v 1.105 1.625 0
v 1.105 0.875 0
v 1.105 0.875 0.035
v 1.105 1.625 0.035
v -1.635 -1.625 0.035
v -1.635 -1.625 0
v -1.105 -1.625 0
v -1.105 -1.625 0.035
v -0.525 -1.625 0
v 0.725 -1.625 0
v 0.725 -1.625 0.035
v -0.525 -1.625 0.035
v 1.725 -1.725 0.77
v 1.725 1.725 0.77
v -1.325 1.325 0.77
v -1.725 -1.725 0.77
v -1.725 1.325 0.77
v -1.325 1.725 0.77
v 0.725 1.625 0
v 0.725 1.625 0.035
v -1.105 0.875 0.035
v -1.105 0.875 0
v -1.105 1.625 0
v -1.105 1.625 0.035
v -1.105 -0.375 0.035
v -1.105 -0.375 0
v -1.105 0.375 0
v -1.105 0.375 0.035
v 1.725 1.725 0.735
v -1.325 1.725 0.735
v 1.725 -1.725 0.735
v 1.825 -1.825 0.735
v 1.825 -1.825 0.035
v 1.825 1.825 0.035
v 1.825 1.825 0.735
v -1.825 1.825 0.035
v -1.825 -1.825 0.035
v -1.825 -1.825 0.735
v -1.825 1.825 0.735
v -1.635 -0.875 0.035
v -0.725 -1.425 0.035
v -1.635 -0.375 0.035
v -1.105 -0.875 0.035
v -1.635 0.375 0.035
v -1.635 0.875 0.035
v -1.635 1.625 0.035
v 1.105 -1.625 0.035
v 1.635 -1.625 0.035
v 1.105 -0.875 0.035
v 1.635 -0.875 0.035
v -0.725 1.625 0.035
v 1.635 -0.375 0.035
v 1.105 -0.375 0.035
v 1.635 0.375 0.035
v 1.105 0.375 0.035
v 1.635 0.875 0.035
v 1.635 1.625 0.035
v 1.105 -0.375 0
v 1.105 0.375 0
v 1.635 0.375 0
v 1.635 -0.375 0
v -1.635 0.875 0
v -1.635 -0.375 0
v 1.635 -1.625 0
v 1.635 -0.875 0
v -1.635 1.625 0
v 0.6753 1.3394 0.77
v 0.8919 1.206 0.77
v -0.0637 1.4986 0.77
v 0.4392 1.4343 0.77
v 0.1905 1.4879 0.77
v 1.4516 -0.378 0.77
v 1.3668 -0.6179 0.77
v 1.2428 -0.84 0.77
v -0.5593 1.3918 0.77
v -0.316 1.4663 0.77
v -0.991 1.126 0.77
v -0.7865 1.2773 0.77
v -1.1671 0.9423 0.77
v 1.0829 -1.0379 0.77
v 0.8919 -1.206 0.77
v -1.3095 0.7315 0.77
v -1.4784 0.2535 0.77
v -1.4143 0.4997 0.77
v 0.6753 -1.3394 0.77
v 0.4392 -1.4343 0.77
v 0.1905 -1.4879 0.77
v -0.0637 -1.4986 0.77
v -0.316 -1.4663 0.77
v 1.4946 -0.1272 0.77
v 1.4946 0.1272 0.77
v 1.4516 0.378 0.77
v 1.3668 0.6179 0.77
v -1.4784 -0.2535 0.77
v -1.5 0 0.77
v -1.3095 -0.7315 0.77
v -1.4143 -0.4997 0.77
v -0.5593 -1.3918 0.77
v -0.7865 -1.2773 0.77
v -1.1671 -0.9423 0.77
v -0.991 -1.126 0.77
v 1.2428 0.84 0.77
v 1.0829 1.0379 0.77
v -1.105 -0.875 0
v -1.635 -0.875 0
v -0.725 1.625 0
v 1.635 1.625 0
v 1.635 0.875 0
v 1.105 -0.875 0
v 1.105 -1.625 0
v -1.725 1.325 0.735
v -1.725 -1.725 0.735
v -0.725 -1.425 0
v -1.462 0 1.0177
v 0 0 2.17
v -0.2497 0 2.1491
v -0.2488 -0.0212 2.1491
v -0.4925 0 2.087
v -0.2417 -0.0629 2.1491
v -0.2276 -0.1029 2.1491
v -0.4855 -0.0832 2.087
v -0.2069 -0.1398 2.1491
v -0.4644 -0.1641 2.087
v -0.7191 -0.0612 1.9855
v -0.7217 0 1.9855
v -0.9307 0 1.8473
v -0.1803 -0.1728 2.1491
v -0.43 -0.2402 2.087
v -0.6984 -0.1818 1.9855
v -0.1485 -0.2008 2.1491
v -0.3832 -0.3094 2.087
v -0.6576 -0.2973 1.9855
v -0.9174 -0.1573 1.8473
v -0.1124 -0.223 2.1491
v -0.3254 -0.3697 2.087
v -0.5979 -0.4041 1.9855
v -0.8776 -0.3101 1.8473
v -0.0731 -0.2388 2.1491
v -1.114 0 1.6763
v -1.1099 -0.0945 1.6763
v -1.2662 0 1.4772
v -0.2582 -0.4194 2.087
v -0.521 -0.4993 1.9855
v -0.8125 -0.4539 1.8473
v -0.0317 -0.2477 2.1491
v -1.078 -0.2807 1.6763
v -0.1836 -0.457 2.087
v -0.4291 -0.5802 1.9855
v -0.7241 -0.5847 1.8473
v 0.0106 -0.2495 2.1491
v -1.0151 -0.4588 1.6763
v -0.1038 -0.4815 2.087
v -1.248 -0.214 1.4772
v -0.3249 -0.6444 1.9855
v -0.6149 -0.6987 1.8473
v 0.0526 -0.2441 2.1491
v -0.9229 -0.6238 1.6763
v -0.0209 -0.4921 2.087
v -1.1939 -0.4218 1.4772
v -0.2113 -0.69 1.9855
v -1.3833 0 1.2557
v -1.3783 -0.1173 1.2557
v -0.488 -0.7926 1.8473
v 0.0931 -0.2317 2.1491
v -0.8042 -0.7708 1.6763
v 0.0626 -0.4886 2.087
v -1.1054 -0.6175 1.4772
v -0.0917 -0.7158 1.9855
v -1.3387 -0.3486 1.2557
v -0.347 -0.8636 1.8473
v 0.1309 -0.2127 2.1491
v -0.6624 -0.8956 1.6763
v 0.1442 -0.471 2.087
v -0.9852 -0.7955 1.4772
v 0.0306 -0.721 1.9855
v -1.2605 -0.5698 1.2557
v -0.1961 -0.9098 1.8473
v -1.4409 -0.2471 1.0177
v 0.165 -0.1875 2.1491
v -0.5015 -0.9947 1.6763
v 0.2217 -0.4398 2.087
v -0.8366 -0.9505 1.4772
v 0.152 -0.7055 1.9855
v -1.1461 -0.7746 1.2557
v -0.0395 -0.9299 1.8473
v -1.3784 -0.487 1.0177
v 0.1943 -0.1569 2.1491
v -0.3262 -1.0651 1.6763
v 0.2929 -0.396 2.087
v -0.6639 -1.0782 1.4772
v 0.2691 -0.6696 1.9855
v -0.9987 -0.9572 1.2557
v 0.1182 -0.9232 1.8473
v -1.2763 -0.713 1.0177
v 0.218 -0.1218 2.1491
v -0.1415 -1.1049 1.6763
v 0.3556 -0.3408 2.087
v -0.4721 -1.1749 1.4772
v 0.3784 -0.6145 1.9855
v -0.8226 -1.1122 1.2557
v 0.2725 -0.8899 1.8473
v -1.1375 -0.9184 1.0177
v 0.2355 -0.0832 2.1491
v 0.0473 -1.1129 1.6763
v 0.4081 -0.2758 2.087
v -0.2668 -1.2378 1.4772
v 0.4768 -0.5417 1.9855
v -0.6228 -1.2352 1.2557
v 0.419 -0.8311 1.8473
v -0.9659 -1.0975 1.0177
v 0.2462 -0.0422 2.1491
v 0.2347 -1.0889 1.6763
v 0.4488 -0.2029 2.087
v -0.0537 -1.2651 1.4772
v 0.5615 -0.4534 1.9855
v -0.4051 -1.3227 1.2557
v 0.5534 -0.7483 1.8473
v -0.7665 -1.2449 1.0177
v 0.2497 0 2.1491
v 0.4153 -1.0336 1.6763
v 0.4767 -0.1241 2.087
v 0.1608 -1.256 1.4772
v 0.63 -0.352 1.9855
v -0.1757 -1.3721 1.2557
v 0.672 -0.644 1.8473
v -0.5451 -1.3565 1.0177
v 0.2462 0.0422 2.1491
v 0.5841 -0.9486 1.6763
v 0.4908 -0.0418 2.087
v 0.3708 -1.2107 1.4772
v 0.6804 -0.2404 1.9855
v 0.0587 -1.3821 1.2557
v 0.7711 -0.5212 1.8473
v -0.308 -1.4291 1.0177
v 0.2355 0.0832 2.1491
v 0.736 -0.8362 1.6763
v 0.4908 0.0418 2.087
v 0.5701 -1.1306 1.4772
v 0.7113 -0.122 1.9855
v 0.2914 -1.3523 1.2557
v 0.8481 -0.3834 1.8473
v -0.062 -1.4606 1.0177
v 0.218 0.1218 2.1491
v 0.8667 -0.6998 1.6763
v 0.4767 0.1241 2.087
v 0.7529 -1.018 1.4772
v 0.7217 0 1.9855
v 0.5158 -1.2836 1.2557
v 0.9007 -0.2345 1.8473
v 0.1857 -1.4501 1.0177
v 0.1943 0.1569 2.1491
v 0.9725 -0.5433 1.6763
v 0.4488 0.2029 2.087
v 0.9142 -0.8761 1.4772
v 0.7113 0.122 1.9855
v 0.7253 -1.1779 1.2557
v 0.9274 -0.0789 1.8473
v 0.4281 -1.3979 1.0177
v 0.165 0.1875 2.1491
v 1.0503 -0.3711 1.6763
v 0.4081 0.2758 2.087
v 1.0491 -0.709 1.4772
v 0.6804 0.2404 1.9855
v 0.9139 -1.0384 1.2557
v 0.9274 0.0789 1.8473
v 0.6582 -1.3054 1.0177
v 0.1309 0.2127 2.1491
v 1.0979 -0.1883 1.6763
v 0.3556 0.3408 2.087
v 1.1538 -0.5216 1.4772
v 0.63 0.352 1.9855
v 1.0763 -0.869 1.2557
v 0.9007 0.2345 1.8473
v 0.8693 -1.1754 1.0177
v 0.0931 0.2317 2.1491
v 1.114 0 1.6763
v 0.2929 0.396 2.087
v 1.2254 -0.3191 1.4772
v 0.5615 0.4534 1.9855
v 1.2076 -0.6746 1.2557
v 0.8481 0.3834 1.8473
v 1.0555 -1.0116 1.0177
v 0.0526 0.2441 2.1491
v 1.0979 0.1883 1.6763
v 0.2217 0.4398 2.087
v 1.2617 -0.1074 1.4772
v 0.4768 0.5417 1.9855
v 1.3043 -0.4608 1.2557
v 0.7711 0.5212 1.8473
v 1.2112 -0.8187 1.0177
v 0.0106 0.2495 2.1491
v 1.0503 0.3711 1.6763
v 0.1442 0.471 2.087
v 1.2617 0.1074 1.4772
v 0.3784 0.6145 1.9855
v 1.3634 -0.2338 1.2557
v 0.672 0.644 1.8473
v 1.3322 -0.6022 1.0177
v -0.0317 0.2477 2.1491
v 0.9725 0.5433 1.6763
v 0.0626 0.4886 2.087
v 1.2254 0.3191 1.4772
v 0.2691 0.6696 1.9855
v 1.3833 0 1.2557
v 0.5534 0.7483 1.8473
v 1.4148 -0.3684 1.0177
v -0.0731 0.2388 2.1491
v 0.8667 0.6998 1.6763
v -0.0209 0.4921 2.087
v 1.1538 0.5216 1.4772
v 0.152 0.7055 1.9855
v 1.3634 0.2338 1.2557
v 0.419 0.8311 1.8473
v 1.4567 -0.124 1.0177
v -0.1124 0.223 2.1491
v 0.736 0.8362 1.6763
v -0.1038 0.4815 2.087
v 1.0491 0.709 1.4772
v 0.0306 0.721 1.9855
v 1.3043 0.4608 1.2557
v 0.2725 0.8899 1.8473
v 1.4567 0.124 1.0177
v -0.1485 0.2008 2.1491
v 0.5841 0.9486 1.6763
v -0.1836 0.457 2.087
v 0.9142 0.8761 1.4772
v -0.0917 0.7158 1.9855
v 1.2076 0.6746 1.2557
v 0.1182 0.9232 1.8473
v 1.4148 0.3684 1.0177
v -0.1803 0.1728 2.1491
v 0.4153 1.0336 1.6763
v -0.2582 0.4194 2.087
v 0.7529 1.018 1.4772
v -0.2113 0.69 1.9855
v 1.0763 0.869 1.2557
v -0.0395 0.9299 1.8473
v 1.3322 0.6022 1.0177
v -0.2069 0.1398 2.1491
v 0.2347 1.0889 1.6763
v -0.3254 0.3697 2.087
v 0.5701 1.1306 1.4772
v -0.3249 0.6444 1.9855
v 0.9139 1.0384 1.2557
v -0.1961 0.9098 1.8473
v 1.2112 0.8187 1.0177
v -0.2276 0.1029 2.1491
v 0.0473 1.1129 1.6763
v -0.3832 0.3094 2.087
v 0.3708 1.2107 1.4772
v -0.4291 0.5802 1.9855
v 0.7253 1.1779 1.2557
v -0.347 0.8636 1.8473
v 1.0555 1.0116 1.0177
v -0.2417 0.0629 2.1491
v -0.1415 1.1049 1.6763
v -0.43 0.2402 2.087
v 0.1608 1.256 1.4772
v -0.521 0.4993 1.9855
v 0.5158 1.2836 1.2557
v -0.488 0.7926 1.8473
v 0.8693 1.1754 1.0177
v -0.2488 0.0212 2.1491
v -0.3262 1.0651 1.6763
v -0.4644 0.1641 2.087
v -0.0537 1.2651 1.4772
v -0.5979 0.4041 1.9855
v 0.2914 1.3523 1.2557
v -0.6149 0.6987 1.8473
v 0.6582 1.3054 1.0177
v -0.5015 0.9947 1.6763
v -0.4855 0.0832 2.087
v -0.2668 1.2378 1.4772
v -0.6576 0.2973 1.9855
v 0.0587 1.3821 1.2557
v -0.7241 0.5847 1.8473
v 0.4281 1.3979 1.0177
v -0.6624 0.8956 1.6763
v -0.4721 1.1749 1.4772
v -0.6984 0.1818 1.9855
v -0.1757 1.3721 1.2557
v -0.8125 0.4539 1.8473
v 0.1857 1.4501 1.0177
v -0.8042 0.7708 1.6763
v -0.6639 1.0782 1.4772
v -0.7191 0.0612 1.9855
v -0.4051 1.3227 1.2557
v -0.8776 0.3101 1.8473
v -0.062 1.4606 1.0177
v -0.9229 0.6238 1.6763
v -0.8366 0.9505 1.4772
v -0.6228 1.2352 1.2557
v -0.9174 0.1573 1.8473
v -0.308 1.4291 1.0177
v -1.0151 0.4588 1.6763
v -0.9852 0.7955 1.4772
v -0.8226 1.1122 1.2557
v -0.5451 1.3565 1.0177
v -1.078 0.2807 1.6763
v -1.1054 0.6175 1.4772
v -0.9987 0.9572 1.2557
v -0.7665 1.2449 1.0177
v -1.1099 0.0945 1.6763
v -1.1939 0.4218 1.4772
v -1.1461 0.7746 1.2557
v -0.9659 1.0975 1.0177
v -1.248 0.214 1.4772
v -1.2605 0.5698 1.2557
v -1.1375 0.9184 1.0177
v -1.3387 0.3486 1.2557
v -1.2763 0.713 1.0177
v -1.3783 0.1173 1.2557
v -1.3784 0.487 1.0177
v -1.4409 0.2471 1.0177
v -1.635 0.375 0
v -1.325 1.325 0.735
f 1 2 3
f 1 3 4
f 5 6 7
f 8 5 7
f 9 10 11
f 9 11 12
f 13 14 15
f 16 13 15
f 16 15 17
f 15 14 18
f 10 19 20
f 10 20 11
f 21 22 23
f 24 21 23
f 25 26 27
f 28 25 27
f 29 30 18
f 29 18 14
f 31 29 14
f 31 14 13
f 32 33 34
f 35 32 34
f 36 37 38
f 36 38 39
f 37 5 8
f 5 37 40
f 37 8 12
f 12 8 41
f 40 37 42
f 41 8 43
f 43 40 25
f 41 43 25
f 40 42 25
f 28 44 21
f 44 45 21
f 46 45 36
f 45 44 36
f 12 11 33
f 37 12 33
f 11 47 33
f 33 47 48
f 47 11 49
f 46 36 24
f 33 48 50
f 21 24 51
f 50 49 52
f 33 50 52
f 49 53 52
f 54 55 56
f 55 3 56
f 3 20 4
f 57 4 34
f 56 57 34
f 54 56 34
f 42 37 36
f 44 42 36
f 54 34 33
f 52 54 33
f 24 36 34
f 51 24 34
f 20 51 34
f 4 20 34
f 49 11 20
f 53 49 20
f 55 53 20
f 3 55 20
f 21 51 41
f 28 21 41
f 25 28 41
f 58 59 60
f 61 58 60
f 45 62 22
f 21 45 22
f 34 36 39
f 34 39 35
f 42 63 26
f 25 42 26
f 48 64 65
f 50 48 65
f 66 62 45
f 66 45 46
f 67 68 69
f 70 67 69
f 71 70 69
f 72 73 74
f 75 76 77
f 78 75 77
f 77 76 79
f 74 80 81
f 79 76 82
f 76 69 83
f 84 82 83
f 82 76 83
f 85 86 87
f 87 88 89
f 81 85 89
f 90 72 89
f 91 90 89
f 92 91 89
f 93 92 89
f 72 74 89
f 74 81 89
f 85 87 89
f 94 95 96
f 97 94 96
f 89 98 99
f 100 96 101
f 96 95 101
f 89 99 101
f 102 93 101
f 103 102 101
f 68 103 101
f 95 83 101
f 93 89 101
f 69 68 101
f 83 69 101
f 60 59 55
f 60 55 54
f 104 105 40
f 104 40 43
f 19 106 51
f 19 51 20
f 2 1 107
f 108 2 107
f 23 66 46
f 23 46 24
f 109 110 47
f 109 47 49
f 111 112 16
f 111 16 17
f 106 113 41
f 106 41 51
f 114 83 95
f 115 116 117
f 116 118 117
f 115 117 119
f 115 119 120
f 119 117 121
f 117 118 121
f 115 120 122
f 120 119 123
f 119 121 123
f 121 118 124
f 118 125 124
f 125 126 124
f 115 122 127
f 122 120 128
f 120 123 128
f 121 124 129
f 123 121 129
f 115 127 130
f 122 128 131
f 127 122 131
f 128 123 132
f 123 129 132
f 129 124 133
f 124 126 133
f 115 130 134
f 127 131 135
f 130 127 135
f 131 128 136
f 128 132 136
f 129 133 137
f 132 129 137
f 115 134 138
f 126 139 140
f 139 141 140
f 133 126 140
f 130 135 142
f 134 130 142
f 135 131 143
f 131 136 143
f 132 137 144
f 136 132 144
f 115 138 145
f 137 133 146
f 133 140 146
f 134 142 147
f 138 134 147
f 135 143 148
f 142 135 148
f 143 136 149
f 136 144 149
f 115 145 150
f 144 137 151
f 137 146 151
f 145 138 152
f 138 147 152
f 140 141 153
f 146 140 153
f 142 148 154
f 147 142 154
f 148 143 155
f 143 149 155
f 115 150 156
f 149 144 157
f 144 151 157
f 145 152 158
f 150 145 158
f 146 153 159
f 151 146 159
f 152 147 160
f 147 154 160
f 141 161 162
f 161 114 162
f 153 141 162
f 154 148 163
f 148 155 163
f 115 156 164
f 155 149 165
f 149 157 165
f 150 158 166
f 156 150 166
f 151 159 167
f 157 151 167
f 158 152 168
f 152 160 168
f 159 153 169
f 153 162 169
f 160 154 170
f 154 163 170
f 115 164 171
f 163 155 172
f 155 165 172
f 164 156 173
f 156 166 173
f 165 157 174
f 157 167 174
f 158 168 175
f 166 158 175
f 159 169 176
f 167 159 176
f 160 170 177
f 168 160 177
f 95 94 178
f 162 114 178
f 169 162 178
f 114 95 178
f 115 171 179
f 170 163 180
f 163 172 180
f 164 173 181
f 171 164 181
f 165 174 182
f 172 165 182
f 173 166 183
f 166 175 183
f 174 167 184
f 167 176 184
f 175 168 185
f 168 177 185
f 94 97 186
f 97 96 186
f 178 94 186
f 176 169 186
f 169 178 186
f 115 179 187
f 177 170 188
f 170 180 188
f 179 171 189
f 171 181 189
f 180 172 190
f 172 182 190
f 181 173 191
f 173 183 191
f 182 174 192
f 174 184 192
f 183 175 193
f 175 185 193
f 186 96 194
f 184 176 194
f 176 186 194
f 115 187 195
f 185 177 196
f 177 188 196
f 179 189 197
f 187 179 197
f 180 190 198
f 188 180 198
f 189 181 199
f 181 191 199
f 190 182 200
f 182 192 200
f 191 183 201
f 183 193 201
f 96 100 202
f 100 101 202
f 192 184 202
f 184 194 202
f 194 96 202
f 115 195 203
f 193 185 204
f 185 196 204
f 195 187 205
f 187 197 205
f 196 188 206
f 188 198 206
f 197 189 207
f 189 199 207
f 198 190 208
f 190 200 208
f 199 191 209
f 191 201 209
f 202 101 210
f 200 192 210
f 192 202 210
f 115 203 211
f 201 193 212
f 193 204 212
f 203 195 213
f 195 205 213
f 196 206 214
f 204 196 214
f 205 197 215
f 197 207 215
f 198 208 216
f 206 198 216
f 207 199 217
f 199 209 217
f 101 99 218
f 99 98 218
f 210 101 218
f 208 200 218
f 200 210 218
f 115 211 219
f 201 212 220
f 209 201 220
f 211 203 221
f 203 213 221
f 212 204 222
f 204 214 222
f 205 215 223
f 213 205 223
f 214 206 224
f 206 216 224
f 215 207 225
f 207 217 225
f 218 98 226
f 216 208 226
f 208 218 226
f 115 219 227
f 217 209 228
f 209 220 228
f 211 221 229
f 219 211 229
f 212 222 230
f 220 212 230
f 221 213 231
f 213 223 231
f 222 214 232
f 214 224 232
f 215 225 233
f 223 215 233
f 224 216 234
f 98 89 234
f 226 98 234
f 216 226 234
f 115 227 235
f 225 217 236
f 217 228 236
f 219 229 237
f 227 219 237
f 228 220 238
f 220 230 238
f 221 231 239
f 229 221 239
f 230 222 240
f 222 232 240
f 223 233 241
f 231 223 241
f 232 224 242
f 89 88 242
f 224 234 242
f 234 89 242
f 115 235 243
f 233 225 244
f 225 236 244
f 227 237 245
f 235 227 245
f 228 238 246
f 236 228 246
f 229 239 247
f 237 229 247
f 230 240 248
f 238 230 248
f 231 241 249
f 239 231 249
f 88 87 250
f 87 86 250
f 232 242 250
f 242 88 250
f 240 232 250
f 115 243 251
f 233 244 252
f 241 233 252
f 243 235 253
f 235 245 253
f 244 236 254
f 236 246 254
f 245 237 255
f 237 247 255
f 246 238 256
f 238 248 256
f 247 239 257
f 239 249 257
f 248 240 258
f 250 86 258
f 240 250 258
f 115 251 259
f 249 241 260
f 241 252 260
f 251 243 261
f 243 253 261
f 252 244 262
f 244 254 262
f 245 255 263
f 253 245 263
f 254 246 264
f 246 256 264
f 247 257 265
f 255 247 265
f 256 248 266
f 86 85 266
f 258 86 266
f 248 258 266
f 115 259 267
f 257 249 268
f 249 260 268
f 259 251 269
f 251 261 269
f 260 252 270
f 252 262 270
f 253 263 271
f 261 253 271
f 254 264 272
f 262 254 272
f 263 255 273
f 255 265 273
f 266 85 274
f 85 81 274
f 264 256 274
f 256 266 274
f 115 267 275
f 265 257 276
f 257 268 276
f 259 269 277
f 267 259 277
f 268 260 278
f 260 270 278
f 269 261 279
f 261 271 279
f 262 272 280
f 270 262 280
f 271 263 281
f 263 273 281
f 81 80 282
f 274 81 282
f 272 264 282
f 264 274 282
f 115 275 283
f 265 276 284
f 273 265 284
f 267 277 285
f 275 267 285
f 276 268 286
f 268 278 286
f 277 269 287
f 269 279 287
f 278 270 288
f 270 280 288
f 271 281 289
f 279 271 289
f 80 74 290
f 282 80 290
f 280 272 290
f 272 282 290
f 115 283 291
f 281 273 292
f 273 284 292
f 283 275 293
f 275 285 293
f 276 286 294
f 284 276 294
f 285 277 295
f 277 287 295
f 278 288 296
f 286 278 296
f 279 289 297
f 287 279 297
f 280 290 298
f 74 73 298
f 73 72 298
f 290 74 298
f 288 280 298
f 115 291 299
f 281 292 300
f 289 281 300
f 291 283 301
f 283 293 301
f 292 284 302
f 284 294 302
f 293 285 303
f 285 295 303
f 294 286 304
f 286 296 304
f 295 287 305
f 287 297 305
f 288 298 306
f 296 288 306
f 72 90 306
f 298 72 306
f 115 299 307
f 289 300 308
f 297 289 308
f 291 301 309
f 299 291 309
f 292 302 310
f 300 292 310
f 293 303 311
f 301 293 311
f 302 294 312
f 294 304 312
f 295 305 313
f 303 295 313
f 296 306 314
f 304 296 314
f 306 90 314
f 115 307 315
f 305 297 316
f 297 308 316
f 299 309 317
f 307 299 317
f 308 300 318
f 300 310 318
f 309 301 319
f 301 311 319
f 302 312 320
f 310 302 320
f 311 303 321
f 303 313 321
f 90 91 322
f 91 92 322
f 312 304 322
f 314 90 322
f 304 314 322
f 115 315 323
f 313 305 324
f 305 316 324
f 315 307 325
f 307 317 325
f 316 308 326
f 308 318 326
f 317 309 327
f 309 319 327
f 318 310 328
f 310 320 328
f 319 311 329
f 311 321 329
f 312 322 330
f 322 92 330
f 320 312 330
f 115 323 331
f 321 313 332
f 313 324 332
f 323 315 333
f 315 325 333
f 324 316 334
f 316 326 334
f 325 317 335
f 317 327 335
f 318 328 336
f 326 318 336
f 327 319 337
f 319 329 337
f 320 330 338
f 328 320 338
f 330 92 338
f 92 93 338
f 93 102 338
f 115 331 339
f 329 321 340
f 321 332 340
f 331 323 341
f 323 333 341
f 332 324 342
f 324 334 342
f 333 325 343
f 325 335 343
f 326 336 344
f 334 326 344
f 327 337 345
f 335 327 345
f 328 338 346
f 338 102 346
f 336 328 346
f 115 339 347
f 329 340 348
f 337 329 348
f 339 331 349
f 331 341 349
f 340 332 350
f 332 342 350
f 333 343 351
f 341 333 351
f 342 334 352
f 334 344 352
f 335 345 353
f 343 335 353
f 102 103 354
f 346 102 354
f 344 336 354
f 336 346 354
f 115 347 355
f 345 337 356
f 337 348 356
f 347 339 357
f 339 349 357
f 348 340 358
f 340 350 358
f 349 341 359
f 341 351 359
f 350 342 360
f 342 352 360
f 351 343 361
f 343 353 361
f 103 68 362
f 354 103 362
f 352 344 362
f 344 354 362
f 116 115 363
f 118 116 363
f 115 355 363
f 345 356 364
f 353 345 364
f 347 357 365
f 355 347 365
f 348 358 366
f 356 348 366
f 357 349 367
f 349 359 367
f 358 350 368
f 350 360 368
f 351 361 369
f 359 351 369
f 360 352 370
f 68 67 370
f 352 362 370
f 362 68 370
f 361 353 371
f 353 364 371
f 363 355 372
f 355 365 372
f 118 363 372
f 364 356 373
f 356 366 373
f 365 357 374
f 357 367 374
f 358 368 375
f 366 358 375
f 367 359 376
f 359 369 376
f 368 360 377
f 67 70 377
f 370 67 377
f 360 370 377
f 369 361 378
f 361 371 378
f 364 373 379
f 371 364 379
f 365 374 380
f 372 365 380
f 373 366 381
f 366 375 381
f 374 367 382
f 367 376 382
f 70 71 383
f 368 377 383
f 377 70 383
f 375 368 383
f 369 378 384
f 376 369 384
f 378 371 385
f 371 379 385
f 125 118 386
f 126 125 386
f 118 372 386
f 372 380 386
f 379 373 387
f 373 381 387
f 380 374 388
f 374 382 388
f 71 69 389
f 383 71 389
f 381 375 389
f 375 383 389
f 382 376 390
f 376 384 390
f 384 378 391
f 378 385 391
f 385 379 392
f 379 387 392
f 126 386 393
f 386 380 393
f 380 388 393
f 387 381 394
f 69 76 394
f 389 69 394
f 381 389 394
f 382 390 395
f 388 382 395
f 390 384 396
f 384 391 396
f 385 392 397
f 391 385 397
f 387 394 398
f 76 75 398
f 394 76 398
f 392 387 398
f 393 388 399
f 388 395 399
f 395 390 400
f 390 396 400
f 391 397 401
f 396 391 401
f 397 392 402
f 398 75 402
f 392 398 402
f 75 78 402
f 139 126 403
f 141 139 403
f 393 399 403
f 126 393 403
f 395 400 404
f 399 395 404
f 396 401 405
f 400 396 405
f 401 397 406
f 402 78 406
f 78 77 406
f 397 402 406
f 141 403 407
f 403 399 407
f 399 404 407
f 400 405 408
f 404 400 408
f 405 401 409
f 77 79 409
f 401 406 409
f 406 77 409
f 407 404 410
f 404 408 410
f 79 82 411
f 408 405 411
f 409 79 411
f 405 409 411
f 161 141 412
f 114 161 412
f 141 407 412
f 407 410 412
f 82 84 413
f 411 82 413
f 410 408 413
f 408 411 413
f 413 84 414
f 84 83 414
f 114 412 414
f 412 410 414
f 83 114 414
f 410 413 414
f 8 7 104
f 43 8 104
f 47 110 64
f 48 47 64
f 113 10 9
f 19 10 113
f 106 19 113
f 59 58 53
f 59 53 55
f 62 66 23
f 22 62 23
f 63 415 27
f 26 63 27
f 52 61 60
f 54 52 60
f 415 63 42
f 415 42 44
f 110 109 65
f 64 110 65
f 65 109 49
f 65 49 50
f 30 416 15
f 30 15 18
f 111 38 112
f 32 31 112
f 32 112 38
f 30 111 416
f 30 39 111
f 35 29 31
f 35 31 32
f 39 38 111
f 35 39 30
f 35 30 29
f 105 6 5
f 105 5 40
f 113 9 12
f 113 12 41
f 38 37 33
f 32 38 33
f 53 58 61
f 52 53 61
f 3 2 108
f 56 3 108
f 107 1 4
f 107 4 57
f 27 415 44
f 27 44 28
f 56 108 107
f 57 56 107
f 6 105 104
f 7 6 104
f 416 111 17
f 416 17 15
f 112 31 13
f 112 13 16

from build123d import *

# Parameters (mm, degrees)
EXTRUDE_1_DEPTH   = 0.035
SKETCH_1_W        = 0.53
SKETCH_1_H        = 0.75
EXTRUDE_1_2_DEPTH = 0.035
EXTRUDE_1_3_DEPTH = 0.035
EXTRUDE_1_4_DEPTH = 0.035
EXTRUDE_1_5_DEPTH = 0.035
EXTRUDE_1_6_DEPTH = 0.035
EXTRUDE_1_7_DEPTH = 0.035
SKETCH_2_W        = 3.65
SKETCH_2_H        = 3.65
EXTRUDE_2_DEPTH   = 0.7
EXTRUDE_3_DEPTH   = 0.035


with BuildPart() as part:
    # Эскиз1 → Бобышка-Вытянуть1 (new body)
    with BuildSketch(Plane.XY):
        Polygon((0.725, -1.625), (-0.525, -1.625), (-0.725, -1.425), (-0.725, 1.625), (0.725, 1.625), align=None)
    extrude(amount=EXTRUDE_1_DEPTH)



with BuildPart() as body_2:
    # Эскиз1 → Extrude 1 2 (new body)
    with BuildSketch(Plane.XY):
        with Locations((1.37, -1.25)):
            Rectangle(SKETCH_1_W, SKETCH_1_H)
    extrude(amount=EXTRUDE_1_2_DEPTH)


with BuildPart() as body_3:
    # Эскиз1 → Extrude 1 3 (new body)
    with BuildSketch(Plane.XY):
        with Locations((-1.37, -1.25)):
            Rectangle(SKETCH_1_W, SKETCH_1_H)
    extrude(amount=EXTRUDE_1_3_DEPTH)


with BuildPart() as body_4:
    # Эскиз1 → Extrude 1 4 (new body)
    with BuildSketch(Plane.XY):
        with Locations((1.37, 0)):
            Rectangle(SKETCH_1_W, SKETCH_1_H)
    extrude(amount=EXTRUDE_1_4_DEPTH)


with BuildPart() as body_5:
    # Эскиз1 → Extrude 1 5 (new body)
    with BuildSketch(Plane.XY):
        with Locations((1.37, 1.25)):
            Rectangle(SKETCH_1_W, SKETCH_1_H)
    extrude(amount=EXTRUDE_1_5_DEPTH)


with BuildPart() as body_6:
    # Эскиз1 → Extrude 1 6 (new body)
    with BuildSketch(Plane.XY):
        with Locations((-1.37, 0)):
            Rectangle(SKETCH_1_W, SKETCH_1_H)
    extrude(amount=EXTRUDE_1_6_DEPTH)


with BuildPart() as body_7:
    # Эскиз1 → Extrude 1 7 (new body)
    with BuildSketch(Plane.XY):
        with Locations((-1.37, 1.25)):
            Rectangle(SKETCH_1_W, SKETCH_1_H)
    extrude(amount=EXTRUDE_1_7_DEPTH)


with BuildPart() as part_1:
    add(part.part)

    add(body_2.part)  # Бобышка-Вытянуть2 merges body 2

    add(body_3.part)  # Бобышка-Вытянуть2 merges body 3

    add(body_4.part)  # Бобышка-Вытянуть2 merges body 4

    add(body_5.part)  # Бобышка-Вытянуть2 merges body 5

    add(body_6.part)  # Бобышка-Вытянуть2 merges body 6

    add(body_7.part)  # Бобышка-Вытянуть2 merges body 7
    # Эскиз2 → Бобышка-Вытянуть2 (add)
    with BuildSketch(Plane.XY.offset(0.035)):
        Rectangle(SKETCH_2_W, SKETCH_2_H)
    extrude(amount=EXTRUDE_2_DEPTH)

    # Эскиз4 → Бобышка-Вытянуть3 (add)
    with BuildSketch(Plane.XY.offset(0.735)):
        Polygon((1.725, 1.725), (1.725, -1.725), (-1.725, -1.725), (-1.725, 1.325), (-1.325, 1.325), (-1.325, 1.725), align=None)
    extrude(amount=EXTRUDE_3_DEPTH)


with BuildPart() as body_2_2:
    # Эскиз3 → Повернуть1 (revolve)
    with BuildSketch(Plane(origin=(0, 0, 0), x_dir=(1, 0, 0), z_dir=(0, 1, 0))):
        with BuildLine():
            Line((0, -0.77), (0, -2.17))
            ThreePointArc((0, -2.17), (-1.025914226, -1.765622385), (-1.5, -0.77))
            Line((-1.5, -0.77), (0, -0.77))
        make_face()
    revolve(axis=Axis((0, 0, 0.77), (0, 0, 1)))


solid = Compound([part_1.part, body_2_2.part])
